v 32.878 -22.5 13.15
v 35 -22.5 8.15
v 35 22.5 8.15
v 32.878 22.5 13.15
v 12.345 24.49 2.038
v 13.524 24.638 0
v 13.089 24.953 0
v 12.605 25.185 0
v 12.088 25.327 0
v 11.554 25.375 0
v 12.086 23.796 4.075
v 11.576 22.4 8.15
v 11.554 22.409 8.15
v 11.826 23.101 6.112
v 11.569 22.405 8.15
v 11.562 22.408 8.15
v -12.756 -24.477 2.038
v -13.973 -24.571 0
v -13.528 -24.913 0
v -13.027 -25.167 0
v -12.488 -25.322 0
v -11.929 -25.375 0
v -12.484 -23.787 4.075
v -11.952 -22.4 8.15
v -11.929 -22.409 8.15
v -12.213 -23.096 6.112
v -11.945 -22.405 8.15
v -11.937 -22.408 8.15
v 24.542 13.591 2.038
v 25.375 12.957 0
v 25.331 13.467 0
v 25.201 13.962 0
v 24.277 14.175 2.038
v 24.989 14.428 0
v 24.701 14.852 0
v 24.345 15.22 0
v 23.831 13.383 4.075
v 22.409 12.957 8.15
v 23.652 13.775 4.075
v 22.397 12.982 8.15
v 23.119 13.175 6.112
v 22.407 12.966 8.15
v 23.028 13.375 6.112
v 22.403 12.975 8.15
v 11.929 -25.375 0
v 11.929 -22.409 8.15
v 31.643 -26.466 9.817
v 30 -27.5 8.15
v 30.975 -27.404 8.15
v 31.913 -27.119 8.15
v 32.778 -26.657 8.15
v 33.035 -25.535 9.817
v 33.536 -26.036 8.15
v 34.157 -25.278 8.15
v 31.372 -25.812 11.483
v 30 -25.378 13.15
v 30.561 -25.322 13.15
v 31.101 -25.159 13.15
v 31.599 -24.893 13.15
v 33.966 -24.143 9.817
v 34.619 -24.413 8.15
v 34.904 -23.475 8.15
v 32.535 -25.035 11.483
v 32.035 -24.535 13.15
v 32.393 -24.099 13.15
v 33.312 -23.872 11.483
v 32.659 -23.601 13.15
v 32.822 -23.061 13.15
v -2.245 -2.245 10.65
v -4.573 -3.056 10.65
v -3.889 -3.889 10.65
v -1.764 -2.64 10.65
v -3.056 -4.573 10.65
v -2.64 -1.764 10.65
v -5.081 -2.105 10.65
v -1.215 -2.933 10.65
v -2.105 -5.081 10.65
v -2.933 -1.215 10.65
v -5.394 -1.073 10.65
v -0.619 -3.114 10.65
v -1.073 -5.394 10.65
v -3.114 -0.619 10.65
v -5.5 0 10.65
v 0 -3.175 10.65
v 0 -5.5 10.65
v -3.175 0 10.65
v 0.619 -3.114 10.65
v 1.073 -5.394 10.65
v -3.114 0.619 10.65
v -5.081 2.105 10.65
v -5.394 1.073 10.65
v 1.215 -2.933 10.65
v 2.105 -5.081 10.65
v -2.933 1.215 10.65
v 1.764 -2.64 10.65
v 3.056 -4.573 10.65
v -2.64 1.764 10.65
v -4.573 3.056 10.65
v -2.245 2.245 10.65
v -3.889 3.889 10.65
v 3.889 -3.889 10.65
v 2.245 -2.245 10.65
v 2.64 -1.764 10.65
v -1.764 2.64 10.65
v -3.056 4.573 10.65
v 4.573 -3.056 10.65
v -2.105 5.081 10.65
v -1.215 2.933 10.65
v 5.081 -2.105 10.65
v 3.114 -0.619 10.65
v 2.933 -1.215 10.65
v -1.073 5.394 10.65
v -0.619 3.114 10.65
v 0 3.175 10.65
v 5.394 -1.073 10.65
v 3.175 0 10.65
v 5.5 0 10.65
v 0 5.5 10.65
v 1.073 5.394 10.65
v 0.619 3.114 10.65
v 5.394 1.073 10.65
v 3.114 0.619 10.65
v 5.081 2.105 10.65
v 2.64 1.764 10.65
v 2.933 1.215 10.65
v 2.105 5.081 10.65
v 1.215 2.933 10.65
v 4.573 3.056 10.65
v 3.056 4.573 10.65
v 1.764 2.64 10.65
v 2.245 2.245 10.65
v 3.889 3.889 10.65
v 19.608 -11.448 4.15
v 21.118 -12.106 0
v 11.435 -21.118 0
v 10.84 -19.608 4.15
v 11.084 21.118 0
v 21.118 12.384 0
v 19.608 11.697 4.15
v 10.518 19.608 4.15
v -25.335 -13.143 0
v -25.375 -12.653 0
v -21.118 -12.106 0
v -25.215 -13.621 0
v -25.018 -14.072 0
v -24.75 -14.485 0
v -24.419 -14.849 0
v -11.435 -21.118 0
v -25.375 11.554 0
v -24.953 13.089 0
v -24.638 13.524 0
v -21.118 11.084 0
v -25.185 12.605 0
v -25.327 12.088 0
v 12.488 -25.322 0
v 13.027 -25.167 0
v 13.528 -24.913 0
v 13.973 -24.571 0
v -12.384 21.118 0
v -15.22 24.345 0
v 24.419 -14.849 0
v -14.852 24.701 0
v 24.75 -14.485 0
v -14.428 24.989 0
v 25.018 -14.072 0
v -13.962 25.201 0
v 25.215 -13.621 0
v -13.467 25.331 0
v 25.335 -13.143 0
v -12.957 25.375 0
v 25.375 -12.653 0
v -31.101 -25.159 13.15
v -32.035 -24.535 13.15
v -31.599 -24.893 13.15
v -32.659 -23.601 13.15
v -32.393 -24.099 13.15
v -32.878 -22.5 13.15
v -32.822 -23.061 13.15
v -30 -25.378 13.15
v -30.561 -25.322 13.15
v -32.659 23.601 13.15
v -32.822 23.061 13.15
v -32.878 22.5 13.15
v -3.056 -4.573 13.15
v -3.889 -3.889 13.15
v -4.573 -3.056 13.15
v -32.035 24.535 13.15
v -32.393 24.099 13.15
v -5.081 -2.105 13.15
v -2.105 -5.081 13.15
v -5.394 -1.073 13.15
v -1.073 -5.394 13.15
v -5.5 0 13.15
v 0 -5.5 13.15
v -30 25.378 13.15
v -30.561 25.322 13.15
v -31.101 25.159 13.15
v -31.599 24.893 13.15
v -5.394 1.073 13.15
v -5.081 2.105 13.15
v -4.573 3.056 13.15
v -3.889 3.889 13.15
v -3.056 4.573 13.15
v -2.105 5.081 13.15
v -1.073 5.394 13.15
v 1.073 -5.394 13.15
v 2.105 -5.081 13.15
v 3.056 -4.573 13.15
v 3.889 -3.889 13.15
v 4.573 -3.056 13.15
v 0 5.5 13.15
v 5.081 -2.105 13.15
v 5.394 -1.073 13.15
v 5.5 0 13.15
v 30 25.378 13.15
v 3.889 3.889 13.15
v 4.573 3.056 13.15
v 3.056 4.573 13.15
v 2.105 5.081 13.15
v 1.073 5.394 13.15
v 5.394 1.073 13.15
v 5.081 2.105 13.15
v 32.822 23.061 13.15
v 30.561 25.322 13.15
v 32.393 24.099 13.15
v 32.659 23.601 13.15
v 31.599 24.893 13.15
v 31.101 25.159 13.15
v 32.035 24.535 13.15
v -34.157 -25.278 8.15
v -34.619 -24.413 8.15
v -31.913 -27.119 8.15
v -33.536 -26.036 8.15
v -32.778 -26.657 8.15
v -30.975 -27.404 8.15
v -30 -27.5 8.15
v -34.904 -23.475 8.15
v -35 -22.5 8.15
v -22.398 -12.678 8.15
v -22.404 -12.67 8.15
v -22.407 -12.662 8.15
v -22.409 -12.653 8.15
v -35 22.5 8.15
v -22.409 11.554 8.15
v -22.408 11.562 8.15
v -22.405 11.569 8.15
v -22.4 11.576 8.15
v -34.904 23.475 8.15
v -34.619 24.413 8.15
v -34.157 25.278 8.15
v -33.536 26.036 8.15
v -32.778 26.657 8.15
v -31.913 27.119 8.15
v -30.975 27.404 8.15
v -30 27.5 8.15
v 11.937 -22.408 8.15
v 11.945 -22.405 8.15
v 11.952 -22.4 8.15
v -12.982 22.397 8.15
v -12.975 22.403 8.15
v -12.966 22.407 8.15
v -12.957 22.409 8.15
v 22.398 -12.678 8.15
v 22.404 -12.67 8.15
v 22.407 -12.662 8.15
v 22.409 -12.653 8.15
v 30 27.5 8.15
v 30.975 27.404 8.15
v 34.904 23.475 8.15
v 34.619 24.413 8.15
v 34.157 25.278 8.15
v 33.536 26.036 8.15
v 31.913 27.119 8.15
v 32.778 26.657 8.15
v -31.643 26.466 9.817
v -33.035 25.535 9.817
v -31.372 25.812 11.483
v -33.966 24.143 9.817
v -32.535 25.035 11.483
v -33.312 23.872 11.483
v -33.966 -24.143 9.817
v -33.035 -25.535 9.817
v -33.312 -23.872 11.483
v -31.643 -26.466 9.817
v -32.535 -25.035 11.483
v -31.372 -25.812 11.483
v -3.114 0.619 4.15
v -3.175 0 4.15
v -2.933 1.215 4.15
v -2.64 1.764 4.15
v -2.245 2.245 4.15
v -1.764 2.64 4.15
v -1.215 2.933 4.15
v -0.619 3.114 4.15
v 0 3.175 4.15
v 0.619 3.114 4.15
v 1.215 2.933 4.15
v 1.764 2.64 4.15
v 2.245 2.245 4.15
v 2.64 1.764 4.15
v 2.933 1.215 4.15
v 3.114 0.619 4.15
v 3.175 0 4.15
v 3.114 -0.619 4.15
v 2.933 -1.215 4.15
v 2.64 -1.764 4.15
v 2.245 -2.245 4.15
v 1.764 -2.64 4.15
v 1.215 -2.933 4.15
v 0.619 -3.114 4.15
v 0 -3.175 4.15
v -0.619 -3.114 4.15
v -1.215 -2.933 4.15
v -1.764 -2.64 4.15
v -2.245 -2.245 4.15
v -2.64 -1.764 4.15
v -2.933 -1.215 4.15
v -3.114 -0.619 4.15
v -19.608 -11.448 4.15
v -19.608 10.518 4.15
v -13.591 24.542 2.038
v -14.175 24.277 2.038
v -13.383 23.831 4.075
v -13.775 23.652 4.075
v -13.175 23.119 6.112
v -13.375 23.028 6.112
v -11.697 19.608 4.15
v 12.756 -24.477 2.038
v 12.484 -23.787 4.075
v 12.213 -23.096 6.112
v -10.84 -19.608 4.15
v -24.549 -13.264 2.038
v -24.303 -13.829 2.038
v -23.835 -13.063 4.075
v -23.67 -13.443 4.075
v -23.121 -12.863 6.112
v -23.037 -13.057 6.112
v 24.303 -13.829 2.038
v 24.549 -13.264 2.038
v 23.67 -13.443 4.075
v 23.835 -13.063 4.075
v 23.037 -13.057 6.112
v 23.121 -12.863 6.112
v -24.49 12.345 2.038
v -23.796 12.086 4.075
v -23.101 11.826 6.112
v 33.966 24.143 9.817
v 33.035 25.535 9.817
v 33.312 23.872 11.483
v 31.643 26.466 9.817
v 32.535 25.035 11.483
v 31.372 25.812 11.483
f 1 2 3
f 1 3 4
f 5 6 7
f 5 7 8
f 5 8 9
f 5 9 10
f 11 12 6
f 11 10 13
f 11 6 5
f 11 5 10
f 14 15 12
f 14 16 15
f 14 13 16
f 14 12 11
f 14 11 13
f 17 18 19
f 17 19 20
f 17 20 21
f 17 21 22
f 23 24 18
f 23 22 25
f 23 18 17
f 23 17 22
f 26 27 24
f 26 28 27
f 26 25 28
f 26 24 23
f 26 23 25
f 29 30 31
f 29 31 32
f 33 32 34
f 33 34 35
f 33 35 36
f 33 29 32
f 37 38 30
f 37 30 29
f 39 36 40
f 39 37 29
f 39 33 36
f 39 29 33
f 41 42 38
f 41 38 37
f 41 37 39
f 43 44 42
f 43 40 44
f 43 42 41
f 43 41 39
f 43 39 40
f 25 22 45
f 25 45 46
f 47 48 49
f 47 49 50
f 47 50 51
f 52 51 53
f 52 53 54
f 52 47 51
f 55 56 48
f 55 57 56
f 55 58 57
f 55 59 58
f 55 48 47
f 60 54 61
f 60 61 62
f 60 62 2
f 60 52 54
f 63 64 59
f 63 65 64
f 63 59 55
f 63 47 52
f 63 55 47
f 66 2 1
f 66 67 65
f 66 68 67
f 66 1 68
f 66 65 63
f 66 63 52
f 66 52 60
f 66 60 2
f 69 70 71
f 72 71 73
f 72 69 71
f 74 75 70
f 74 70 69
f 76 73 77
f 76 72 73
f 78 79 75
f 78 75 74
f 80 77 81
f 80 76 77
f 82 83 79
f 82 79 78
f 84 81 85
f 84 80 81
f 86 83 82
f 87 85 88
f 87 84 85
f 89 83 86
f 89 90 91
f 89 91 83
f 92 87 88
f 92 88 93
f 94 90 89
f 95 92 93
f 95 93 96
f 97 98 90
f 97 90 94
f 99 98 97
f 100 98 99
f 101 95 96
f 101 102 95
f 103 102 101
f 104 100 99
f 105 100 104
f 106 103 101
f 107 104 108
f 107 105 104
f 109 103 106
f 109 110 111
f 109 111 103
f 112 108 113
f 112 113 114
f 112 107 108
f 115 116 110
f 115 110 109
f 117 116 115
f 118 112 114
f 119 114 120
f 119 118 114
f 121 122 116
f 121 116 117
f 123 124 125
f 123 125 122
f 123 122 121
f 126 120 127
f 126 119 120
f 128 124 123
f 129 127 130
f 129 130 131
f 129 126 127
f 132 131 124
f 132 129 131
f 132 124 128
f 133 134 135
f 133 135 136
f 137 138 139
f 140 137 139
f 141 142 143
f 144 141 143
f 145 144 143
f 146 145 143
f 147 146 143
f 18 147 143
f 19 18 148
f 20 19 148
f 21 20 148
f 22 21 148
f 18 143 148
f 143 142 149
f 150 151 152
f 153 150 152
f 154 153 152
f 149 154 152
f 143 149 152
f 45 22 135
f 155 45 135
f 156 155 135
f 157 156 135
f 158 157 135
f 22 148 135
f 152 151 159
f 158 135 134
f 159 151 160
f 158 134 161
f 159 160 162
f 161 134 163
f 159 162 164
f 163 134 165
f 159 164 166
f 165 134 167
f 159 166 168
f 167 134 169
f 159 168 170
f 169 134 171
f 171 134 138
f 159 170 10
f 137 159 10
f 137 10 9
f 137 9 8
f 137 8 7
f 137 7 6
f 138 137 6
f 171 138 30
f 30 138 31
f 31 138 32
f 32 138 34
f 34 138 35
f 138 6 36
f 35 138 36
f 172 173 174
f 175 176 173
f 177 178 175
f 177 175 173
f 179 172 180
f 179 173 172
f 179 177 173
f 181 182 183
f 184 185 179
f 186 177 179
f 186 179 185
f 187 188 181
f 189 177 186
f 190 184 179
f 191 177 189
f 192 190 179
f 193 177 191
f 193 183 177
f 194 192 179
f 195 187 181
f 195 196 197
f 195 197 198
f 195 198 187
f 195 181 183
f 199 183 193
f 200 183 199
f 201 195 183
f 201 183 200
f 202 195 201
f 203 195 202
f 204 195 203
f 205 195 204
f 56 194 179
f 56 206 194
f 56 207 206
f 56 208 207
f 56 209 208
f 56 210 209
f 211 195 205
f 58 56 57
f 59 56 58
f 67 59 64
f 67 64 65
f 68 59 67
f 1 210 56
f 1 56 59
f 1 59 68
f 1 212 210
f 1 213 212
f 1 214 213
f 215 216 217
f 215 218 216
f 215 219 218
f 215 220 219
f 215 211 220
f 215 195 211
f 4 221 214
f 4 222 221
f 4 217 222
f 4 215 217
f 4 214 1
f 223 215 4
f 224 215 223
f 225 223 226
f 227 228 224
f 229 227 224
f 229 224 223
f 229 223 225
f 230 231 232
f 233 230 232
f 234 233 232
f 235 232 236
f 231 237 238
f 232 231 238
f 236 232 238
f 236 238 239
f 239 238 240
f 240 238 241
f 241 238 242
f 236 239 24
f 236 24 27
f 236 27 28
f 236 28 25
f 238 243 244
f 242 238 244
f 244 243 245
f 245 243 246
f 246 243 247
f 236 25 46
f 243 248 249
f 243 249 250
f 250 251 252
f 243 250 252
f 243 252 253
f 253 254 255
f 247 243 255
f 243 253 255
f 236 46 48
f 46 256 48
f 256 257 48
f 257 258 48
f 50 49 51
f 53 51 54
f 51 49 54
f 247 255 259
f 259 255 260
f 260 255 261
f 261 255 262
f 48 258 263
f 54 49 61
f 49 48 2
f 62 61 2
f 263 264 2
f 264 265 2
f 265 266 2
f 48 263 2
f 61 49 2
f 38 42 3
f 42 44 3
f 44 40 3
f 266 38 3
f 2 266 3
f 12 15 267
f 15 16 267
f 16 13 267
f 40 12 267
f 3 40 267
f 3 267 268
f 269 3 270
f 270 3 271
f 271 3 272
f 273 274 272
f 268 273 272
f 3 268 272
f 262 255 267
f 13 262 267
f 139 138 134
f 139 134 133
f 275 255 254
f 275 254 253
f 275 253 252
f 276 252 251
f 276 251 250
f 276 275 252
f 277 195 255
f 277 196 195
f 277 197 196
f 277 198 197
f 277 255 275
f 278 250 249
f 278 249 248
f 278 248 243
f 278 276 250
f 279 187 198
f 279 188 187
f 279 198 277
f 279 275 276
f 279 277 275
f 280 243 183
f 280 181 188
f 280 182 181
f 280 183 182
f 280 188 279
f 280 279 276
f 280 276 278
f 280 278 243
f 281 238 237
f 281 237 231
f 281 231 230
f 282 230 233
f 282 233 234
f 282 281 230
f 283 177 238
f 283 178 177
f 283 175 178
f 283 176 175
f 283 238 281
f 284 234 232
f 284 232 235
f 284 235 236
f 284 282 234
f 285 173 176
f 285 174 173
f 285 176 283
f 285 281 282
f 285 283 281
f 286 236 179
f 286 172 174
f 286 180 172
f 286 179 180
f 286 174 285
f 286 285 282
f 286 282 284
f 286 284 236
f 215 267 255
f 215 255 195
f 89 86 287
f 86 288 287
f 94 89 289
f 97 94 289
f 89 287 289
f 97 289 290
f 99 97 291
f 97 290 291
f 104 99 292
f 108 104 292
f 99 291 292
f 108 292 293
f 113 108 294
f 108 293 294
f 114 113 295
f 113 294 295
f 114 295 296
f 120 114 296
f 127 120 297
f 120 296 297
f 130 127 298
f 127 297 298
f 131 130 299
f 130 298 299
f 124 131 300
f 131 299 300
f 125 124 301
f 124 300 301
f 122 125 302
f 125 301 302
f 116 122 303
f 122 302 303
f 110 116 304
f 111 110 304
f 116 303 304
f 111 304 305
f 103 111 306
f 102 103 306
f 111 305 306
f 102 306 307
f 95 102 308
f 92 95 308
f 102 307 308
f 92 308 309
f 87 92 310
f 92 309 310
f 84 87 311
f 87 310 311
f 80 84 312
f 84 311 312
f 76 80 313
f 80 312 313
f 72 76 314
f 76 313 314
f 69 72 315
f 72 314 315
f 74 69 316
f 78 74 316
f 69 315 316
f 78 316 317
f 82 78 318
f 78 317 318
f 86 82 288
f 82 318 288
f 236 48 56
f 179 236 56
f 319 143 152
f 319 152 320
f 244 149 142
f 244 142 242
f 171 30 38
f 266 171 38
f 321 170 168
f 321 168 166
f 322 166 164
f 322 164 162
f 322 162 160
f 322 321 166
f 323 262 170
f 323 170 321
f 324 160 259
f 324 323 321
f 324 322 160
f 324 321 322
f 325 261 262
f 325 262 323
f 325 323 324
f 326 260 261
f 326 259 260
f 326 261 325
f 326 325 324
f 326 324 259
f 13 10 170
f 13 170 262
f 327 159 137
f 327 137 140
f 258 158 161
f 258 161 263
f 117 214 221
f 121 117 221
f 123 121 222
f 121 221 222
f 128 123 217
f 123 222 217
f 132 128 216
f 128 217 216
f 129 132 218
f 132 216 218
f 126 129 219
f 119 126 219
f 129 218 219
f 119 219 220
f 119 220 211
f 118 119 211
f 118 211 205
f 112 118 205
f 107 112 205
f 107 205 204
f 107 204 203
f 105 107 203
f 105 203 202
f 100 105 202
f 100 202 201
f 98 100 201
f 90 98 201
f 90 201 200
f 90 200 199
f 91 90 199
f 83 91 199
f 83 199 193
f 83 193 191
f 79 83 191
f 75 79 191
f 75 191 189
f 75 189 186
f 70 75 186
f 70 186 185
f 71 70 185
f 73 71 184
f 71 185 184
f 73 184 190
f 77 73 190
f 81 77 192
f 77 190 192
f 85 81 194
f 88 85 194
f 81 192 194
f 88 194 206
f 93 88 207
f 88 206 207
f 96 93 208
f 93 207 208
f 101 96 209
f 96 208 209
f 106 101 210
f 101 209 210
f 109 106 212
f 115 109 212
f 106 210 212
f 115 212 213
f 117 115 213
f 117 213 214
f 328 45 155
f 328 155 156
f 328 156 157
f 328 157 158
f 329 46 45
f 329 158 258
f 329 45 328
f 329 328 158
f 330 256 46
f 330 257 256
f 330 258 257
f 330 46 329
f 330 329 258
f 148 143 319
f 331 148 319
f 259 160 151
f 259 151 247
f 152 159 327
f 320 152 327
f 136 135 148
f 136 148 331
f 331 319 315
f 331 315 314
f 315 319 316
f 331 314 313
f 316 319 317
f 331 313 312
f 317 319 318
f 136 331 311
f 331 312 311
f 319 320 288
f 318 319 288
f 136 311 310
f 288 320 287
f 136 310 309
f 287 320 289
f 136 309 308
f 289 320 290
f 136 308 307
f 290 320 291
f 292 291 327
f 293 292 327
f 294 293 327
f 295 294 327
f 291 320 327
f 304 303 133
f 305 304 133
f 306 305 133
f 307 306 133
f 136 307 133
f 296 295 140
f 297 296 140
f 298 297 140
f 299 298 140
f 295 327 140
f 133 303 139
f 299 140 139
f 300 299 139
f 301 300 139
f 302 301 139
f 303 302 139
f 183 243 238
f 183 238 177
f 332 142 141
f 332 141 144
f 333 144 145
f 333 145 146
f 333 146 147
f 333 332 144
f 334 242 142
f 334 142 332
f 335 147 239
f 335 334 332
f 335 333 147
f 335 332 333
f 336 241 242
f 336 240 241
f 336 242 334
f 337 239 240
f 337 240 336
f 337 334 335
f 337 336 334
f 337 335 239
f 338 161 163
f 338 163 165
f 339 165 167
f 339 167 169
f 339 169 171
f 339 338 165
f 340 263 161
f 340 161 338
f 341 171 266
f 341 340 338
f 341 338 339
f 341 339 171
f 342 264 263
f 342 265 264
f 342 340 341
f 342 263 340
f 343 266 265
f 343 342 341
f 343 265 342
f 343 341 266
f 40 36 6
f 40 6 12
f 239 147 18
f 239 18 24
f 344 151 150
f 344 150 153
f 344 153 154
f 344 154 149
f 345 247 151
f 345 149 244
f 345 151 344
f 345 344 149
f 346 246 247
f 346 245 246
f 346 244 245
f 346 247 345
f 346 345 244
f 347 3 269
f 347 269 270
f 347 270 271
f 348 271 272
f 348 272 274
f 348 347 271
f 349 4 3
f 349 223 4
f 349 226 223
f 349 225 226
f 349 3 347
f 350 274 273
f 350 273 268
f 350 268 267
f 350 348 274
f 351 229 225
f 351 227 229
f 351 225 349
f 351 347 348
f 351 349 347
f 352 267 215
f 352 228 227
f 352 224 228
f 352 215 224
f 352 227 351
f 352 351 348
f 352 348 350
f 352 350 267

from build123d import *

# Parameters (mm, degrees)
F1_DEPTH       = 8.15
F1_TAPER       = 20
F2_T           = -4
F4_DEPTH       = 5
F4_TAPER       = 23
F6_D           = 6.35
F6_CBORE_D     = 11
F6_CBORE_DEPTH = 2.5


with BuildPart() as f1:
    # F0 (on Top) → F1 (new body)
    with BuildSketch(Plane.XY):
        with BuildLine():
            ThreePointArc((13.5235004185, 24.6379186874), (12.605417789, 25.1846935831), (11.5539321881, 25.375))
            Line((11.5539321881, 25.375), (-12.9567069347, 25.375))
            ThreePointArc((-12.9567069347, 25.375), (-14.1999477217, 25.1052659844), (-15.2196256222, 24.3445682304))
            Line((-15.2196256222, 24.3445682304), (-24.6379186874, 13.5235004185))
            ThreePointArc((-24.6379186874, 13.5235004185), (-25.1846935831, 12.605417789), (-25.375, 11.5539321881))
            Line((-25.375, 11.5539321881), (-25.375, -12.6529412227))
            ThreePointArc((-25.375, -12.6529412227), (-25.1255957189, -13.8505318001), (-24.4188512059, -14.8489995662))
            Line((-24.4188512059, -14.8489995662), (-13.972783394, -24.5710583435))
            ThreePointArc((-13.972783394, -24.5710583435), (-13.0270726549, -25.1667893035), (-11.9289321881, -25.375))
            Line((-11.9289321881, -25.375), (11.9289321881, -25.375))
            ThreePointArc((11.9289321881, -25.375), (13.0270726549, -25.1667893035), (13.972783394, -24.5710583435))
            Line((13.972783394, -24.5710583435), (24.4188512059, -14.8489995662))
            ThreePointArc((24.4188512059, -14.8489995662), (25.1255957189, -13.8505318001), (25.375, -12.6529412227))
            Line((25.375, -12.6529412227), (25.375, 12.9567069347))
            ThreePointArc((25.375, 12.9567069347), (25.1052659844, 14.1999477217), (24.3445682304, 15.2196256222))
            Line((24.3445682304, 15.2196256222), (13.5235004185, 24.6379186874))
        make_face()
    extrude(amount=F1_DEPTH, taper=F1_TAPER)

    # F2
    f2_openings = [f1.faces().sort_by_distance(p)[0] for p in [
        (0.016382, 0.006023, 0),
    ]]
    offset(amount=F2_T, openings=f2_openings)

    # F3 (on face) → F4 (join)
    with BuildSketch(Plane.XY.offset(8.15)):
        with BuildLine():
            ThreePointArc((35, 22.5), (33.5355339059, 26.0355339059), (30, 27.5))
            Line((30, 27.5), (-30, 27.5))
            ThreePointArc((-30, 27.5), (-33.5355339059, 26.0355339059), (-35, 22.5))
            Line((-35, 22.5), (-35, -22.5))
            ThreePointArc((-35, -22.5), (-33.5355339059, -26.0355339059), (-30, -27.5))
            Line((-30, -27.5), (30, -27.5))
            ThreePointArc((30, -27.5), (33.5355339059, -26.0355339059), (35, -22.5))
            Line((35, -22.5), (35, 22.5))
        make_face()
        with BuildLine():
            Line((11.5760193141, 22.4003768158), (22.397087126, 12.9820837505))
            ThreePointArc((22.397087126, 12.9820837505), (22.4056177404, 12.9706488817), (22.4086425907, 12.9567069347))
            Line((22.4086425907, 12.9567069347), (22.4086425907, -12.6529412227))
            ThreePointArc((22.4086425907, -12.6529412227), (22.405845722, -12.6663712392), (22.3979201499, -12.6775682533))
            Line((22.3979201499, -12.6775682533), (11.951852338, -22.3996270307))
            ThreePointArc((11.951852338, -22.3996270307), (11.9412469516, -22.406307675), (11.9289321881, -22.4086425907))
            Line((11.9289321881, -22.4086425907), (-11.9289321881, -22.4086425907))
            ThreePointArc((-11.9289321881, -22.4086425907), (-11.9412469516, -22.406307675), (-11.951852338, -22.3996270307))
            Line((-11.951852338, -22.3996270307), (-22.3979201499, -12.6775682533))
            ThreePointArc((-22.3979201499, -12.6775682533), (-22.405845722, -12.6663712392), (-22.4086425907, -12.6529412227))
            Line((-22.4086425907, -12.6529412227), (-22.4086425907, 11.5539321881))
            ThreePointArc((-22.4086425907, 11.5539321881), (-22.4065084571, 11.5657237547), (-22.4003768158, 11.5760193141))
            Line((-22.4003768158, 11.5760193141), (-12.9820837505, 22.397087126))
            ThreePointArc((-12.9820837505, 22.397087126), (-12.9706488817, 22.4056177404), (-12.9567069347, 22.4086425907))
            Line((-12.9567069347, 22.4086425907), (11.5539321881, 22.4086425907))
            ThreePointArc((11.5539321881, 22.4086425907), (11.5657237547, 22.4065084571), (11.5760193141, 22.4003768158))
        make_face(mode=Mode.SUBTRACT)
        with BuildLine():
            ThreePointArc((22.4086425907, 12.9567069347), (22.4056177404, 12.9706488817), (22.397087126, 12.9820837505))
            Line((22.397087126, 12.9820837505), (11.5760193141, 22.4003768158))
            ThreePointArc((11.5760193141, 22.4003768158), (11.5657237547, 22.4065084571), (11.5539321881, 22.4086425907))
            Line((11.5539321881, 22.4086425907), (-12.9567069347, 22.4086425907))
            ThreePointArc((-12.9567069347, 22.4086425907), (-12.9706488817, 22.4056177404), (-12.9820837505, 22.397087126))
            Line((-12.9820837505, 22.397087126), (-22.4003768158, 11.5760193141))
            ThreePointArc((-22.4003768158, 11.5760193141), (-22.4065084571, 11.5657237547), (-22.4086425907, 11.5539321881))
            Line((-22.4086425907, 11.5539321881), (-22.4086425907, -12.6529412227))
            ThreePointArc((-22.4086425907, -12.6529412227), (-22.405845722, -12.6663712392), (-22.3979201499, -12.6775682533))
            Line((-22.3979201499, -12.6775682533), (-11.951852338, -22.3996270307))
            ThreePointArc((-11.951852338, -22.3996270307), (-11.9412469516, -22.406307675), (-11.9289321881, -22.4086425907))
            Line((-11.9289321881, -22.4086425907), (11.9289321881, -22.4086425907))
            ThreePointArc((11.9289321881, -22.4086425907), (11.9412469516, -22.406307675), (11.951852338, -22.3996270307))
            Line((11.951852338, -22.3996270307), (22.3979201499, -12.6775682533))
            ThreePointArc((22.3979201499, -12.6775682533), (22.405845722, -12.6663712392), (22.4086425907, -12.6529412227))
            Line((22.4086425907, -12.6529412227), (22.4086425907, 12.9567069347))
        make_face()
    extrude(amount=F4_DEPTH, taper=F4_TAPER)

    # F6 (through all)
    with Locations(Plane.XY.offset(13.15)):
        with Locations((0, 0)):
            CounterBoreHole(F6_D / 2, F6_CBORE_D / 2, F6_CBORE_DEPTH)


solid = f1.part
